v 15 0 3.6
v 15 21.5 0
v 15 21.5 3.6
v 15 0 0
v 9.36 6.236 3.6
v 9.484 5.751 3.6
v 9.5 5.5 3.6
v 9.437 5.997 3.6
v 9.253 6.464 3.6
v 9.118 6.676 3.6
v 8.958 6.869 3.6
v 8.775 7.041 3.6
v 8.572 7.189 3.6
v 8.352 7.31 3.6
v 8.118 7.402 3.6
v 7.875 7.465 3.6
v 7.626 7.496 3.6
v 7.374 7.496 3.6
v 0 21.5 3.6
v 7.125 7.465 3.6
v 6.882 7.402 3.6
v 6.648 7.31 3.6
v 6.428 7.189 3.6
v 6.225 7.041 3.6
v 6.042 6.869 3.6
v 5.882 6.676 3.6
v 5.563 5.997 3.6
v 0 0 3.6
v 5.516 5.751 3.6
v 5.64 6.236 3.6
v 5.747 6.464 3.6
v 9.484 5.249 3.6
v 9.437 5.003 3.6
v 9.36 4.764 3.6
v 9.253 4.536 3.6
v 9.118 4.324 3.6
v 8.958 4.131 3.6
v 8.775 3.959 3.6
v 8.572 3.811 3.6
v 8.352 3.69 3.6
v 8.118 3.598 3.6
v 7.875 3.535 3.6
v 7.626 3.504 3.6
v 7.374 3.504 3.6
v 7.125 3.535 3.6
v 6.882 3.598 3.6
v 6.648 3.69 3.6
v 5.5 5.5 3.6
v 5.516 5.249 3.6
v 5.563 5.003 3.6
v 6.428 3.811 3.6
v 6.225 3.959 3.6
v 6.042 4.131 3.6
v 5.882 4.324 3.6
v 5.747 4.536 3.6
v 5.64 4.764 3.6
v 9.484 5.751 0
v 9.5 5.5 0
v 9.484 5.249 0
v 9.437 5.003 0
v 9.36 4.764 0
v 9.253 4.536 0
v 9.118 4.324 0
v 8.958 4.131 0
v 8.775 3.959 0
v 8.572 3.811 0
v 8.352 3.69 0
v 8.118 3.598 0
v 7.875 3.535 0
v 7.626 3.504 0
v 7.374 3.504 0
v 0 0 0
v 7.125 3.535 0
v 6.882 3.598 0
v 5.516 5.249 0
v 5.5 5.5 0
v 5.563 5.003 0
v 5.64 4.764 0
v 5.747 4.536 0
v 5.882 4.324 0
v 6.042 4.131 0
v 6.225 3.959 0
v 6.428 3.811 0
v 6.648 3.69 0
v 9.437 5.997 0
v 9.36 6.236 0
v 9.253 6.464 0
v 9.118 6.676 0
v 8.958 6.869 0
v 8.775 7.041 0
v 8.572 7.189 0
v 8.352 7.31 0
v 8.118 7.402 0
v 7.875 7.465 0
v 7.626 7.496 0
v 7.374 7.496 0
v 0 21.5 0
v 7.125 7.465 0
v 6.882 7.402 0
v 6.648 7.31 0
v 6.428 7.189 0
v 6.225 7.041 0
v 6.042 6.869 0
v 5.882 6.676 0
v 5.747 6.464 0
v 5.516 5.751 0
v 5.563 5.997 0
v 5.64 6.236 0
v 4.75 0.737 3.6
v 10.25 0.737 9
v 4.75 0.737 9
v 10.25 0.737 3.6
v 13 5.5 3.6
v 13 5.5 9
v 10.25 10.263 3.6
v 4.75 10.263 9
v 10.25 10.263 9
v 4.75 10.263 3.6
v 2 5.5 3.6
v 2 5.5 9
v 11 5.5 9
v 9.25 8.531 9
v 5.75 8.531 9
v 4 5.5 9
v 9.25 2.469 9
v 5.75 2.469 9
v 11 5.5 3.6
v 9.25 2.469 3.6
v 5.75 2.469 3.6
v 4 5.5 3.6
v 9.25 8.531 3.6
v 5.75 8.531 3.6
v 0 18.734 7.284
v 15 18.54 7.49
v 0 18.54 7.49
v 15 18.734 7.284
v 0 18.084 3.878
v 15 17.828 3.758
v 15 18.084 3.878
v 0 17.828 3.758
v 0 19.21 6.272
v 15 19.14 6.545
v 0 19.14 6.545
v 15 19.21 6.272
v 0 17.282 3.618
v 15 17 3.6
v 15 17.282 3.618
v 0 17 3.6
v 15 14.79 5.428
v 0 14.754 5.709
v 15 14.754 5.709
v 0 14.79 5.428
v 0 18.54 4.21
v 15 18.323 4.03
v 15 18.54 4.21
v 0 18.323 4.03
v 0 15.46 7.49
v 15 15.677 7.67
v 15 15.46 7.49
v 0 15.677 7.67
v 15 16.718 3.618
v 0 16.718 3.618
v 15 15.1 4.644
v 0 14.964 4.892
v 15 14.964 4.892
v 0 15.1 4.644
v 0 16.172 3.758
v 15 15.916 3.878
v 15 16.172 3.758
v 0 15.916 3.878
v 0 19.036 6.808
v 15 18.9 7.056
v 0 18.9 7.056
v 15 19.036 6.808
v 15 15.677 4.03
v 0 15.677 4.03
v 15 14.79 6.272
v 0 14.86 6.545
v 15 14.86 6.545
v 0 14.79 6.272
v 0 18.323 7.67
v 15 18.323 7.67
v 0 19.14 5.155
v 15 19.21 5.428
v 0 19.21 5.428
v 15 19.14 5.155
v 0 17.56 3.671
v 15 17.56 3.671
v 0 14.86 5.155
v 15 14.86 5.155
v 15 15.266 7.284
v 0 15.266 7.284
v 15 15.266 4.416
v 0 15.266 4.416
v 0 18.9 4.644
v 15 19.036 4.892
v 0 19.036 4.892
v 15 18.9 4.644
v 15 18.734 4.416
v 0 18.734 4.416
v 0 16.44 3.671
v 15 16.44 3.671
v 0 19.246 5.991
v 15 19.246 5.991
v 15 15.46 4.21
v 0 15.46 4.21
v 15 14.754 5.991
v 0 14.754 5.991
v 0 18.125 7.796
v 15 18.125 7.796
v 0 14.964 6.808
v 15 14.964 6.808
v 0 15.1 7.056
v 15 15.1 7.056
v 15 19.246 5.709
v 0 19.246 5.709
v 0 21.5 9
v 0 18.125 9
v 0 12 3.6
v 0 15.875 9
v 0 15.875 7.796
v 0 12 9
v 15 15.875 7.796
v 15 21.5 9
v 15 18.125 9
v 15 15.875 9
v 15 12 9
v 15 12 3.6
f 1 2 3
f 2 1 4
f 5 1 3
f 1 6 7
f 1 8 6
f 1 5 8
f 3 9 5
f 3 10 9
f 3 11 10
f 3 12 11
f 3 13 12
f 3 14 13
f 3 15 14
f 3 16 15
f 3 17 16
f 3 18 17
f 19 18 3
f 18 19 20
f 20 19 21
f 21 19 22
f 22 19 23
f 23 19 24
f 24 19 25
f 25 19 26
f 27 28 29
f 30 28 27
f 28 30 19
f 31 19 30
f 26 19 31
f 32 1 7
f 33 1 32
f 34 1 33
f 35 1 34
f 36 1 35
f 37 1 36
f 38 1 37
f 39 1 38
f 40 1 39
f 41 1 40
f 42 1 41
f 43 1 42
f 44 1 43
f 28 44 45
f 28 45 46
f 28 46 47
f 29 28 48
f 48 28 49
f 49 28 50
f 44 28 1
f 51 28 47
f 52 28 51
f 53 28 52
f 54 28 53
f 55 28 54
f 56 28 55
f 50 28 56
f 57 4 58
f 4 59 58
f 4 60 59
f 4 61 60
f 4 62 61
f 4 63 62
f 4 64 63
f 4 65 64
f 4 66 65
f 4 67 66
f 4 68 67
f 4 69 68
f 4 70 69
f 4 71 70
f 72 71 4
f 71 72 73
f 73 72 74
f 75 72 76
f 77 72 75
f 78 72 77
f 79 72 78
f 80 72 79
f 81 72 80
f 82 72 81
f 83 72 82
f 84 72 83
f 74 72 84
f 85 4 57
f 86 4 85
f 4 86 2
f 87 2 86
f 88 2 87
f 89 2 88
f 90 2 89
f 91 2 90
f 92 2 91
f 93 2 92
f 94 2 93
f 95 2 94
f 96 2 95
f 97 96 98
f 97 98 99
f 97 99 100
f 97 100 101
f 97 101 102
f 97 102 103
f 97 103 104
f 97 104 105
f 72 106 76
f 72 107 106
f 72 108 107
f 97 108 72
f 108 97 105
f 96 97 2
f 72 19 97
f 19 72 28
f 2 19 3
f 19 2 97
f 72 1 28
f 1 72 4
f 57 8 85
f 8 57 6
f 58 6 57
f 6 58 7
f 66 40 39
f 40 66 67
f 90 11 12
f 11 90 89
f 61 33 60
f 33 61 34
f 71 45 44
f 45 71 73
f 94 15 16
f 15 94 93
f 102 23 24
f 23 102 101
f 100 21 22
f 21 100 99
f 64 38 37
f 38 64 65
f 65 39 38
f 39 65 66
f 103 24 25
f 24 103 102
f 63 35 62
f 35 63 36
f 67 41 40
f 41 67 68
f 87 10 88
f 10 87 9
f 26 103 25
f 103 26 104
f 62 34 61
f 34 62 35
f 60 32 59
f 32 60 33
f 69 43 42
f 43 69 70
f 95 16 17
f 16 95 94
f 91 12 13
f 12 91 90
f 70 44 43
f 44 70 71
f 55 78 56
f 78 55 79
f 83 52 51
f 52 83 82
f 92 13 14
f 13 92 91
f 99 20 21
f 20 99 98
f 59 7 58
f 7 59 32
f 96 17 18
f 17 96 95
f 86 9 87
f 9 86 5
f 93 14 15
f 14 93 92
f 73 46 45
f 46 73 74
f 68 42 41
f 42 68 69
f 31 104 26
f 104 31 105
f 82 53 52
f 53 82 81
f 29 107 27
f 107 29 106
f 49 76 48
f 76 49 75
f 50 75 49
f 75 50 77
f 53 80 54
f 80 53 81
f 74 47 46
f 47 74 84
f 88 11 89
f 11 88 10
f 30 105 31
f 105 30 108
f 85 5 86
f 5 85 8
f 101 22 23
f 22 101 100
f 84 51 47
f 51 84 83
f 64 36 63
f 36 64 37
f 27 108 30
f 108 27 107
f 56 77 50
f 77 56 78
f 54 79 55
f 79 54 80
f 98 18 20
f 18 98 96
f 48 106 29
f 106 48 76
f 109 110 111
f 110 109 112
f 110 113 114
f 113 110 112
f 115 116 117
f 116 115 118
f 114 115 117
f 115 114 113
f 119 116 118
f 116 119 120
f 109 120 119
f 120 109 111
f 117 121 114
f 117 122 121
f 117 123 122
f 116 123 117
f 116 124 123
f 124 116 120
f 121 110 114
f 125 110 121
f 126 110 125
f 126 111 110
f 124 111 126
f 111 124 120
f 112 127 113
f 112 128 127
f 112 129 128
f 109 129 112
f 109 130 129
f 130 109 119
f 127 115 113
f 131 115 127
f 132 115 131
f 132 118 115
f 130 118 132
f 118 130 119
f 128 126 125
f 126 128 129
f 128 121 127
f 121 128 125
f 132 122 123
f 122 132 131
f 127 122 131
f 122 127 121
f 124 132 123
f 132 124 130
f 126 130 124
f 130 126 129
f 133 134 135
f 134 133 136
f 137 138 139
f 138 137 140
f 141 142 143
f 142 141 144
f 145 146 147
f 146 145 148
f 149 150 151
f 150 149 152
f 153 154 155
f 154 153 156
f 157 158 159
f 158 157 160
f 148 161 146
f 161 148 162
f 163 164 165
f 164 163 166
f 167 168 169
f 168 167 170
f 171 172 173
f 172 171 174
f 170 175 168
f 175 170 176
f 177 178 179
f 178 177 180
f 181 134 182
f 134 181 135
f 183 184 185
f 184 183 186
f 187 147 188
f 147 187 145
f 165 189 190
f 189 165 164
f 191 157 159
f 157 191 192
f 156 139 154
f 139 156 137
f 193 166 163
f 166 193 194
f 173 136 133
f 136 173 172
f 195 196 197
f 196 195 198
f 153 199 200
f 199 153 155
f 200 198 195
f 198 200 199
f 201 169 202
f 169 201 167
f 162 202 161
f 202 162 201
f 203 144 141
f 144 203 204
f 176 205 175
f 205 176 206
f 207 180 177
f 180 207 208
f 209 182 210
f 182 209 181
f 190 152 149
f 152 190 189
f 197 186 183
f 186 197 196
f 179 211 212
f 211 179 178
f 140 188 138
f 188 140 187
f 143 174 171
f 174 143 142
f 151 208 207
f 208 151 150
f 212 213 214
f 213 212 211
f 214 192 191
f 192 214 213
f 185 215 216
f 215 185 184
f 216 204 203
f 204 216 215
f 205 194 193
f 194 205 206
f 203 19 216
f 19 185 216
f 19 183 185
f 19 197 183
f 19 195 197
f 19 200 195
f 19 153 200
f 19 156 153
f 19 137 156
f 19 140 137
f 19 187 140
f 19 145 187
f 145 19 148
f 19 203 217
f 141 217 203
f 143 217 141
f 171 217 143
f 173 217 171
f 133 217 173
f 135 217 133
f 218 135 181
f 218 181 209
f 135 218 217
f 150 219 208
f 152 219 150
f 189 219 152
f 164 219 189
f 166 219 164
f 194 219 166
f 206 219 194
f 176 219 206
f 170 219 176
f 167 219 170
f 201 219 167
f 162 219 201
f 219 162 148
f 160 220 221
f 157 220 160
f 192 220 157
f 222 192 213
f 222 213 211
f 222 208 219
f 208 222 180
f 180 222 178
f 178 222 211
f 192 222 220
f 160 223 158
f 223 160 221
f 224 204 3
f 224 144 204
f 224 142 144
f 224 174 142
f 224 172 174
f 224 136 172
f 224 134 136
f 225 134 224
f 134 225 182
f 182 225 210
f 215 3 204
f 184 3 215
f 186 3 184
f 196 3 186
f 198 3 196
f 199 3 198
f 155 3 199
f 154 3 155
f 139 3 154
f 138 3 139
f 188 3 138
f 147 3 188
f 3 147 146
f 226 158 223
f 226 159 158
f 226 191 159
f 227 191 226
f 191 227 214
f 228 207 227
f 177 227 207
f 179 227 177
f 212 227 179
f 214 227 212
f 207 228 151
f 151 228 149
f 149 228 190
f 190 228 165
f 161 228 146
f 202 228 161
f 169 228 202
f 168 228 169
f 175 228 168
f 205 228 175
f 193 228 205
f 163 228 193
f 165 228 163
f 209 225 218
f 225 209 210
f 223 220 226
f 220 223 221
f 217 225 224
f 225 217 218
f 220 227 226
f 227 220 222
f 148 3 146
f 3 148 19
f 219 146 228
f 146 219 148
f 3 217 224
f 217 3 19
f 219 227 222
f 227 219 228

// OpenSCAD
w = 15;
nut = 10;
nut_margin = 2;
nut_h = 7;
tube = 4.5;
h = tube;
tube_margin = 5;


module plate(){
	cube([w,nut+nut_margin+tube+tube_margin,h*0.8]);
}

module hex(){
	$fn=6;
	translate([w/2,nut_h/2+nut_margin,h*0.8]){
		difference(){
			cylinder(h*1.2,nut_h/2+nut_margin,nut_h/2+nut_margin);
			cylinder(h*1.2,nut_h/2,nut_h/2);
		}
	}
}

module tube(){
	$fn=50;
	translate([0,nut+nut_margin,h*0.8]){
		difference(){
			cube([w,tube+tube_margin,h*1.2]);
			translate([0,tube_margin,h/2]){
				union(){
					rotate([0,90,0]){
						cylinder(w,tube/2,tube/2);
					}
					translate([0,-tube/4,tube/3]){
						cube([w,tube/2,tube/2]);
					}
				}
			}
		}
	}
}

module screw_hole(){
	$fn=50;
	cylinder(h,2,2);
}

difference(){
	plate(); 
	translate([w/2,nut_h/2+nut_margin,0]) screw_hole();
}
hex();
tube();
